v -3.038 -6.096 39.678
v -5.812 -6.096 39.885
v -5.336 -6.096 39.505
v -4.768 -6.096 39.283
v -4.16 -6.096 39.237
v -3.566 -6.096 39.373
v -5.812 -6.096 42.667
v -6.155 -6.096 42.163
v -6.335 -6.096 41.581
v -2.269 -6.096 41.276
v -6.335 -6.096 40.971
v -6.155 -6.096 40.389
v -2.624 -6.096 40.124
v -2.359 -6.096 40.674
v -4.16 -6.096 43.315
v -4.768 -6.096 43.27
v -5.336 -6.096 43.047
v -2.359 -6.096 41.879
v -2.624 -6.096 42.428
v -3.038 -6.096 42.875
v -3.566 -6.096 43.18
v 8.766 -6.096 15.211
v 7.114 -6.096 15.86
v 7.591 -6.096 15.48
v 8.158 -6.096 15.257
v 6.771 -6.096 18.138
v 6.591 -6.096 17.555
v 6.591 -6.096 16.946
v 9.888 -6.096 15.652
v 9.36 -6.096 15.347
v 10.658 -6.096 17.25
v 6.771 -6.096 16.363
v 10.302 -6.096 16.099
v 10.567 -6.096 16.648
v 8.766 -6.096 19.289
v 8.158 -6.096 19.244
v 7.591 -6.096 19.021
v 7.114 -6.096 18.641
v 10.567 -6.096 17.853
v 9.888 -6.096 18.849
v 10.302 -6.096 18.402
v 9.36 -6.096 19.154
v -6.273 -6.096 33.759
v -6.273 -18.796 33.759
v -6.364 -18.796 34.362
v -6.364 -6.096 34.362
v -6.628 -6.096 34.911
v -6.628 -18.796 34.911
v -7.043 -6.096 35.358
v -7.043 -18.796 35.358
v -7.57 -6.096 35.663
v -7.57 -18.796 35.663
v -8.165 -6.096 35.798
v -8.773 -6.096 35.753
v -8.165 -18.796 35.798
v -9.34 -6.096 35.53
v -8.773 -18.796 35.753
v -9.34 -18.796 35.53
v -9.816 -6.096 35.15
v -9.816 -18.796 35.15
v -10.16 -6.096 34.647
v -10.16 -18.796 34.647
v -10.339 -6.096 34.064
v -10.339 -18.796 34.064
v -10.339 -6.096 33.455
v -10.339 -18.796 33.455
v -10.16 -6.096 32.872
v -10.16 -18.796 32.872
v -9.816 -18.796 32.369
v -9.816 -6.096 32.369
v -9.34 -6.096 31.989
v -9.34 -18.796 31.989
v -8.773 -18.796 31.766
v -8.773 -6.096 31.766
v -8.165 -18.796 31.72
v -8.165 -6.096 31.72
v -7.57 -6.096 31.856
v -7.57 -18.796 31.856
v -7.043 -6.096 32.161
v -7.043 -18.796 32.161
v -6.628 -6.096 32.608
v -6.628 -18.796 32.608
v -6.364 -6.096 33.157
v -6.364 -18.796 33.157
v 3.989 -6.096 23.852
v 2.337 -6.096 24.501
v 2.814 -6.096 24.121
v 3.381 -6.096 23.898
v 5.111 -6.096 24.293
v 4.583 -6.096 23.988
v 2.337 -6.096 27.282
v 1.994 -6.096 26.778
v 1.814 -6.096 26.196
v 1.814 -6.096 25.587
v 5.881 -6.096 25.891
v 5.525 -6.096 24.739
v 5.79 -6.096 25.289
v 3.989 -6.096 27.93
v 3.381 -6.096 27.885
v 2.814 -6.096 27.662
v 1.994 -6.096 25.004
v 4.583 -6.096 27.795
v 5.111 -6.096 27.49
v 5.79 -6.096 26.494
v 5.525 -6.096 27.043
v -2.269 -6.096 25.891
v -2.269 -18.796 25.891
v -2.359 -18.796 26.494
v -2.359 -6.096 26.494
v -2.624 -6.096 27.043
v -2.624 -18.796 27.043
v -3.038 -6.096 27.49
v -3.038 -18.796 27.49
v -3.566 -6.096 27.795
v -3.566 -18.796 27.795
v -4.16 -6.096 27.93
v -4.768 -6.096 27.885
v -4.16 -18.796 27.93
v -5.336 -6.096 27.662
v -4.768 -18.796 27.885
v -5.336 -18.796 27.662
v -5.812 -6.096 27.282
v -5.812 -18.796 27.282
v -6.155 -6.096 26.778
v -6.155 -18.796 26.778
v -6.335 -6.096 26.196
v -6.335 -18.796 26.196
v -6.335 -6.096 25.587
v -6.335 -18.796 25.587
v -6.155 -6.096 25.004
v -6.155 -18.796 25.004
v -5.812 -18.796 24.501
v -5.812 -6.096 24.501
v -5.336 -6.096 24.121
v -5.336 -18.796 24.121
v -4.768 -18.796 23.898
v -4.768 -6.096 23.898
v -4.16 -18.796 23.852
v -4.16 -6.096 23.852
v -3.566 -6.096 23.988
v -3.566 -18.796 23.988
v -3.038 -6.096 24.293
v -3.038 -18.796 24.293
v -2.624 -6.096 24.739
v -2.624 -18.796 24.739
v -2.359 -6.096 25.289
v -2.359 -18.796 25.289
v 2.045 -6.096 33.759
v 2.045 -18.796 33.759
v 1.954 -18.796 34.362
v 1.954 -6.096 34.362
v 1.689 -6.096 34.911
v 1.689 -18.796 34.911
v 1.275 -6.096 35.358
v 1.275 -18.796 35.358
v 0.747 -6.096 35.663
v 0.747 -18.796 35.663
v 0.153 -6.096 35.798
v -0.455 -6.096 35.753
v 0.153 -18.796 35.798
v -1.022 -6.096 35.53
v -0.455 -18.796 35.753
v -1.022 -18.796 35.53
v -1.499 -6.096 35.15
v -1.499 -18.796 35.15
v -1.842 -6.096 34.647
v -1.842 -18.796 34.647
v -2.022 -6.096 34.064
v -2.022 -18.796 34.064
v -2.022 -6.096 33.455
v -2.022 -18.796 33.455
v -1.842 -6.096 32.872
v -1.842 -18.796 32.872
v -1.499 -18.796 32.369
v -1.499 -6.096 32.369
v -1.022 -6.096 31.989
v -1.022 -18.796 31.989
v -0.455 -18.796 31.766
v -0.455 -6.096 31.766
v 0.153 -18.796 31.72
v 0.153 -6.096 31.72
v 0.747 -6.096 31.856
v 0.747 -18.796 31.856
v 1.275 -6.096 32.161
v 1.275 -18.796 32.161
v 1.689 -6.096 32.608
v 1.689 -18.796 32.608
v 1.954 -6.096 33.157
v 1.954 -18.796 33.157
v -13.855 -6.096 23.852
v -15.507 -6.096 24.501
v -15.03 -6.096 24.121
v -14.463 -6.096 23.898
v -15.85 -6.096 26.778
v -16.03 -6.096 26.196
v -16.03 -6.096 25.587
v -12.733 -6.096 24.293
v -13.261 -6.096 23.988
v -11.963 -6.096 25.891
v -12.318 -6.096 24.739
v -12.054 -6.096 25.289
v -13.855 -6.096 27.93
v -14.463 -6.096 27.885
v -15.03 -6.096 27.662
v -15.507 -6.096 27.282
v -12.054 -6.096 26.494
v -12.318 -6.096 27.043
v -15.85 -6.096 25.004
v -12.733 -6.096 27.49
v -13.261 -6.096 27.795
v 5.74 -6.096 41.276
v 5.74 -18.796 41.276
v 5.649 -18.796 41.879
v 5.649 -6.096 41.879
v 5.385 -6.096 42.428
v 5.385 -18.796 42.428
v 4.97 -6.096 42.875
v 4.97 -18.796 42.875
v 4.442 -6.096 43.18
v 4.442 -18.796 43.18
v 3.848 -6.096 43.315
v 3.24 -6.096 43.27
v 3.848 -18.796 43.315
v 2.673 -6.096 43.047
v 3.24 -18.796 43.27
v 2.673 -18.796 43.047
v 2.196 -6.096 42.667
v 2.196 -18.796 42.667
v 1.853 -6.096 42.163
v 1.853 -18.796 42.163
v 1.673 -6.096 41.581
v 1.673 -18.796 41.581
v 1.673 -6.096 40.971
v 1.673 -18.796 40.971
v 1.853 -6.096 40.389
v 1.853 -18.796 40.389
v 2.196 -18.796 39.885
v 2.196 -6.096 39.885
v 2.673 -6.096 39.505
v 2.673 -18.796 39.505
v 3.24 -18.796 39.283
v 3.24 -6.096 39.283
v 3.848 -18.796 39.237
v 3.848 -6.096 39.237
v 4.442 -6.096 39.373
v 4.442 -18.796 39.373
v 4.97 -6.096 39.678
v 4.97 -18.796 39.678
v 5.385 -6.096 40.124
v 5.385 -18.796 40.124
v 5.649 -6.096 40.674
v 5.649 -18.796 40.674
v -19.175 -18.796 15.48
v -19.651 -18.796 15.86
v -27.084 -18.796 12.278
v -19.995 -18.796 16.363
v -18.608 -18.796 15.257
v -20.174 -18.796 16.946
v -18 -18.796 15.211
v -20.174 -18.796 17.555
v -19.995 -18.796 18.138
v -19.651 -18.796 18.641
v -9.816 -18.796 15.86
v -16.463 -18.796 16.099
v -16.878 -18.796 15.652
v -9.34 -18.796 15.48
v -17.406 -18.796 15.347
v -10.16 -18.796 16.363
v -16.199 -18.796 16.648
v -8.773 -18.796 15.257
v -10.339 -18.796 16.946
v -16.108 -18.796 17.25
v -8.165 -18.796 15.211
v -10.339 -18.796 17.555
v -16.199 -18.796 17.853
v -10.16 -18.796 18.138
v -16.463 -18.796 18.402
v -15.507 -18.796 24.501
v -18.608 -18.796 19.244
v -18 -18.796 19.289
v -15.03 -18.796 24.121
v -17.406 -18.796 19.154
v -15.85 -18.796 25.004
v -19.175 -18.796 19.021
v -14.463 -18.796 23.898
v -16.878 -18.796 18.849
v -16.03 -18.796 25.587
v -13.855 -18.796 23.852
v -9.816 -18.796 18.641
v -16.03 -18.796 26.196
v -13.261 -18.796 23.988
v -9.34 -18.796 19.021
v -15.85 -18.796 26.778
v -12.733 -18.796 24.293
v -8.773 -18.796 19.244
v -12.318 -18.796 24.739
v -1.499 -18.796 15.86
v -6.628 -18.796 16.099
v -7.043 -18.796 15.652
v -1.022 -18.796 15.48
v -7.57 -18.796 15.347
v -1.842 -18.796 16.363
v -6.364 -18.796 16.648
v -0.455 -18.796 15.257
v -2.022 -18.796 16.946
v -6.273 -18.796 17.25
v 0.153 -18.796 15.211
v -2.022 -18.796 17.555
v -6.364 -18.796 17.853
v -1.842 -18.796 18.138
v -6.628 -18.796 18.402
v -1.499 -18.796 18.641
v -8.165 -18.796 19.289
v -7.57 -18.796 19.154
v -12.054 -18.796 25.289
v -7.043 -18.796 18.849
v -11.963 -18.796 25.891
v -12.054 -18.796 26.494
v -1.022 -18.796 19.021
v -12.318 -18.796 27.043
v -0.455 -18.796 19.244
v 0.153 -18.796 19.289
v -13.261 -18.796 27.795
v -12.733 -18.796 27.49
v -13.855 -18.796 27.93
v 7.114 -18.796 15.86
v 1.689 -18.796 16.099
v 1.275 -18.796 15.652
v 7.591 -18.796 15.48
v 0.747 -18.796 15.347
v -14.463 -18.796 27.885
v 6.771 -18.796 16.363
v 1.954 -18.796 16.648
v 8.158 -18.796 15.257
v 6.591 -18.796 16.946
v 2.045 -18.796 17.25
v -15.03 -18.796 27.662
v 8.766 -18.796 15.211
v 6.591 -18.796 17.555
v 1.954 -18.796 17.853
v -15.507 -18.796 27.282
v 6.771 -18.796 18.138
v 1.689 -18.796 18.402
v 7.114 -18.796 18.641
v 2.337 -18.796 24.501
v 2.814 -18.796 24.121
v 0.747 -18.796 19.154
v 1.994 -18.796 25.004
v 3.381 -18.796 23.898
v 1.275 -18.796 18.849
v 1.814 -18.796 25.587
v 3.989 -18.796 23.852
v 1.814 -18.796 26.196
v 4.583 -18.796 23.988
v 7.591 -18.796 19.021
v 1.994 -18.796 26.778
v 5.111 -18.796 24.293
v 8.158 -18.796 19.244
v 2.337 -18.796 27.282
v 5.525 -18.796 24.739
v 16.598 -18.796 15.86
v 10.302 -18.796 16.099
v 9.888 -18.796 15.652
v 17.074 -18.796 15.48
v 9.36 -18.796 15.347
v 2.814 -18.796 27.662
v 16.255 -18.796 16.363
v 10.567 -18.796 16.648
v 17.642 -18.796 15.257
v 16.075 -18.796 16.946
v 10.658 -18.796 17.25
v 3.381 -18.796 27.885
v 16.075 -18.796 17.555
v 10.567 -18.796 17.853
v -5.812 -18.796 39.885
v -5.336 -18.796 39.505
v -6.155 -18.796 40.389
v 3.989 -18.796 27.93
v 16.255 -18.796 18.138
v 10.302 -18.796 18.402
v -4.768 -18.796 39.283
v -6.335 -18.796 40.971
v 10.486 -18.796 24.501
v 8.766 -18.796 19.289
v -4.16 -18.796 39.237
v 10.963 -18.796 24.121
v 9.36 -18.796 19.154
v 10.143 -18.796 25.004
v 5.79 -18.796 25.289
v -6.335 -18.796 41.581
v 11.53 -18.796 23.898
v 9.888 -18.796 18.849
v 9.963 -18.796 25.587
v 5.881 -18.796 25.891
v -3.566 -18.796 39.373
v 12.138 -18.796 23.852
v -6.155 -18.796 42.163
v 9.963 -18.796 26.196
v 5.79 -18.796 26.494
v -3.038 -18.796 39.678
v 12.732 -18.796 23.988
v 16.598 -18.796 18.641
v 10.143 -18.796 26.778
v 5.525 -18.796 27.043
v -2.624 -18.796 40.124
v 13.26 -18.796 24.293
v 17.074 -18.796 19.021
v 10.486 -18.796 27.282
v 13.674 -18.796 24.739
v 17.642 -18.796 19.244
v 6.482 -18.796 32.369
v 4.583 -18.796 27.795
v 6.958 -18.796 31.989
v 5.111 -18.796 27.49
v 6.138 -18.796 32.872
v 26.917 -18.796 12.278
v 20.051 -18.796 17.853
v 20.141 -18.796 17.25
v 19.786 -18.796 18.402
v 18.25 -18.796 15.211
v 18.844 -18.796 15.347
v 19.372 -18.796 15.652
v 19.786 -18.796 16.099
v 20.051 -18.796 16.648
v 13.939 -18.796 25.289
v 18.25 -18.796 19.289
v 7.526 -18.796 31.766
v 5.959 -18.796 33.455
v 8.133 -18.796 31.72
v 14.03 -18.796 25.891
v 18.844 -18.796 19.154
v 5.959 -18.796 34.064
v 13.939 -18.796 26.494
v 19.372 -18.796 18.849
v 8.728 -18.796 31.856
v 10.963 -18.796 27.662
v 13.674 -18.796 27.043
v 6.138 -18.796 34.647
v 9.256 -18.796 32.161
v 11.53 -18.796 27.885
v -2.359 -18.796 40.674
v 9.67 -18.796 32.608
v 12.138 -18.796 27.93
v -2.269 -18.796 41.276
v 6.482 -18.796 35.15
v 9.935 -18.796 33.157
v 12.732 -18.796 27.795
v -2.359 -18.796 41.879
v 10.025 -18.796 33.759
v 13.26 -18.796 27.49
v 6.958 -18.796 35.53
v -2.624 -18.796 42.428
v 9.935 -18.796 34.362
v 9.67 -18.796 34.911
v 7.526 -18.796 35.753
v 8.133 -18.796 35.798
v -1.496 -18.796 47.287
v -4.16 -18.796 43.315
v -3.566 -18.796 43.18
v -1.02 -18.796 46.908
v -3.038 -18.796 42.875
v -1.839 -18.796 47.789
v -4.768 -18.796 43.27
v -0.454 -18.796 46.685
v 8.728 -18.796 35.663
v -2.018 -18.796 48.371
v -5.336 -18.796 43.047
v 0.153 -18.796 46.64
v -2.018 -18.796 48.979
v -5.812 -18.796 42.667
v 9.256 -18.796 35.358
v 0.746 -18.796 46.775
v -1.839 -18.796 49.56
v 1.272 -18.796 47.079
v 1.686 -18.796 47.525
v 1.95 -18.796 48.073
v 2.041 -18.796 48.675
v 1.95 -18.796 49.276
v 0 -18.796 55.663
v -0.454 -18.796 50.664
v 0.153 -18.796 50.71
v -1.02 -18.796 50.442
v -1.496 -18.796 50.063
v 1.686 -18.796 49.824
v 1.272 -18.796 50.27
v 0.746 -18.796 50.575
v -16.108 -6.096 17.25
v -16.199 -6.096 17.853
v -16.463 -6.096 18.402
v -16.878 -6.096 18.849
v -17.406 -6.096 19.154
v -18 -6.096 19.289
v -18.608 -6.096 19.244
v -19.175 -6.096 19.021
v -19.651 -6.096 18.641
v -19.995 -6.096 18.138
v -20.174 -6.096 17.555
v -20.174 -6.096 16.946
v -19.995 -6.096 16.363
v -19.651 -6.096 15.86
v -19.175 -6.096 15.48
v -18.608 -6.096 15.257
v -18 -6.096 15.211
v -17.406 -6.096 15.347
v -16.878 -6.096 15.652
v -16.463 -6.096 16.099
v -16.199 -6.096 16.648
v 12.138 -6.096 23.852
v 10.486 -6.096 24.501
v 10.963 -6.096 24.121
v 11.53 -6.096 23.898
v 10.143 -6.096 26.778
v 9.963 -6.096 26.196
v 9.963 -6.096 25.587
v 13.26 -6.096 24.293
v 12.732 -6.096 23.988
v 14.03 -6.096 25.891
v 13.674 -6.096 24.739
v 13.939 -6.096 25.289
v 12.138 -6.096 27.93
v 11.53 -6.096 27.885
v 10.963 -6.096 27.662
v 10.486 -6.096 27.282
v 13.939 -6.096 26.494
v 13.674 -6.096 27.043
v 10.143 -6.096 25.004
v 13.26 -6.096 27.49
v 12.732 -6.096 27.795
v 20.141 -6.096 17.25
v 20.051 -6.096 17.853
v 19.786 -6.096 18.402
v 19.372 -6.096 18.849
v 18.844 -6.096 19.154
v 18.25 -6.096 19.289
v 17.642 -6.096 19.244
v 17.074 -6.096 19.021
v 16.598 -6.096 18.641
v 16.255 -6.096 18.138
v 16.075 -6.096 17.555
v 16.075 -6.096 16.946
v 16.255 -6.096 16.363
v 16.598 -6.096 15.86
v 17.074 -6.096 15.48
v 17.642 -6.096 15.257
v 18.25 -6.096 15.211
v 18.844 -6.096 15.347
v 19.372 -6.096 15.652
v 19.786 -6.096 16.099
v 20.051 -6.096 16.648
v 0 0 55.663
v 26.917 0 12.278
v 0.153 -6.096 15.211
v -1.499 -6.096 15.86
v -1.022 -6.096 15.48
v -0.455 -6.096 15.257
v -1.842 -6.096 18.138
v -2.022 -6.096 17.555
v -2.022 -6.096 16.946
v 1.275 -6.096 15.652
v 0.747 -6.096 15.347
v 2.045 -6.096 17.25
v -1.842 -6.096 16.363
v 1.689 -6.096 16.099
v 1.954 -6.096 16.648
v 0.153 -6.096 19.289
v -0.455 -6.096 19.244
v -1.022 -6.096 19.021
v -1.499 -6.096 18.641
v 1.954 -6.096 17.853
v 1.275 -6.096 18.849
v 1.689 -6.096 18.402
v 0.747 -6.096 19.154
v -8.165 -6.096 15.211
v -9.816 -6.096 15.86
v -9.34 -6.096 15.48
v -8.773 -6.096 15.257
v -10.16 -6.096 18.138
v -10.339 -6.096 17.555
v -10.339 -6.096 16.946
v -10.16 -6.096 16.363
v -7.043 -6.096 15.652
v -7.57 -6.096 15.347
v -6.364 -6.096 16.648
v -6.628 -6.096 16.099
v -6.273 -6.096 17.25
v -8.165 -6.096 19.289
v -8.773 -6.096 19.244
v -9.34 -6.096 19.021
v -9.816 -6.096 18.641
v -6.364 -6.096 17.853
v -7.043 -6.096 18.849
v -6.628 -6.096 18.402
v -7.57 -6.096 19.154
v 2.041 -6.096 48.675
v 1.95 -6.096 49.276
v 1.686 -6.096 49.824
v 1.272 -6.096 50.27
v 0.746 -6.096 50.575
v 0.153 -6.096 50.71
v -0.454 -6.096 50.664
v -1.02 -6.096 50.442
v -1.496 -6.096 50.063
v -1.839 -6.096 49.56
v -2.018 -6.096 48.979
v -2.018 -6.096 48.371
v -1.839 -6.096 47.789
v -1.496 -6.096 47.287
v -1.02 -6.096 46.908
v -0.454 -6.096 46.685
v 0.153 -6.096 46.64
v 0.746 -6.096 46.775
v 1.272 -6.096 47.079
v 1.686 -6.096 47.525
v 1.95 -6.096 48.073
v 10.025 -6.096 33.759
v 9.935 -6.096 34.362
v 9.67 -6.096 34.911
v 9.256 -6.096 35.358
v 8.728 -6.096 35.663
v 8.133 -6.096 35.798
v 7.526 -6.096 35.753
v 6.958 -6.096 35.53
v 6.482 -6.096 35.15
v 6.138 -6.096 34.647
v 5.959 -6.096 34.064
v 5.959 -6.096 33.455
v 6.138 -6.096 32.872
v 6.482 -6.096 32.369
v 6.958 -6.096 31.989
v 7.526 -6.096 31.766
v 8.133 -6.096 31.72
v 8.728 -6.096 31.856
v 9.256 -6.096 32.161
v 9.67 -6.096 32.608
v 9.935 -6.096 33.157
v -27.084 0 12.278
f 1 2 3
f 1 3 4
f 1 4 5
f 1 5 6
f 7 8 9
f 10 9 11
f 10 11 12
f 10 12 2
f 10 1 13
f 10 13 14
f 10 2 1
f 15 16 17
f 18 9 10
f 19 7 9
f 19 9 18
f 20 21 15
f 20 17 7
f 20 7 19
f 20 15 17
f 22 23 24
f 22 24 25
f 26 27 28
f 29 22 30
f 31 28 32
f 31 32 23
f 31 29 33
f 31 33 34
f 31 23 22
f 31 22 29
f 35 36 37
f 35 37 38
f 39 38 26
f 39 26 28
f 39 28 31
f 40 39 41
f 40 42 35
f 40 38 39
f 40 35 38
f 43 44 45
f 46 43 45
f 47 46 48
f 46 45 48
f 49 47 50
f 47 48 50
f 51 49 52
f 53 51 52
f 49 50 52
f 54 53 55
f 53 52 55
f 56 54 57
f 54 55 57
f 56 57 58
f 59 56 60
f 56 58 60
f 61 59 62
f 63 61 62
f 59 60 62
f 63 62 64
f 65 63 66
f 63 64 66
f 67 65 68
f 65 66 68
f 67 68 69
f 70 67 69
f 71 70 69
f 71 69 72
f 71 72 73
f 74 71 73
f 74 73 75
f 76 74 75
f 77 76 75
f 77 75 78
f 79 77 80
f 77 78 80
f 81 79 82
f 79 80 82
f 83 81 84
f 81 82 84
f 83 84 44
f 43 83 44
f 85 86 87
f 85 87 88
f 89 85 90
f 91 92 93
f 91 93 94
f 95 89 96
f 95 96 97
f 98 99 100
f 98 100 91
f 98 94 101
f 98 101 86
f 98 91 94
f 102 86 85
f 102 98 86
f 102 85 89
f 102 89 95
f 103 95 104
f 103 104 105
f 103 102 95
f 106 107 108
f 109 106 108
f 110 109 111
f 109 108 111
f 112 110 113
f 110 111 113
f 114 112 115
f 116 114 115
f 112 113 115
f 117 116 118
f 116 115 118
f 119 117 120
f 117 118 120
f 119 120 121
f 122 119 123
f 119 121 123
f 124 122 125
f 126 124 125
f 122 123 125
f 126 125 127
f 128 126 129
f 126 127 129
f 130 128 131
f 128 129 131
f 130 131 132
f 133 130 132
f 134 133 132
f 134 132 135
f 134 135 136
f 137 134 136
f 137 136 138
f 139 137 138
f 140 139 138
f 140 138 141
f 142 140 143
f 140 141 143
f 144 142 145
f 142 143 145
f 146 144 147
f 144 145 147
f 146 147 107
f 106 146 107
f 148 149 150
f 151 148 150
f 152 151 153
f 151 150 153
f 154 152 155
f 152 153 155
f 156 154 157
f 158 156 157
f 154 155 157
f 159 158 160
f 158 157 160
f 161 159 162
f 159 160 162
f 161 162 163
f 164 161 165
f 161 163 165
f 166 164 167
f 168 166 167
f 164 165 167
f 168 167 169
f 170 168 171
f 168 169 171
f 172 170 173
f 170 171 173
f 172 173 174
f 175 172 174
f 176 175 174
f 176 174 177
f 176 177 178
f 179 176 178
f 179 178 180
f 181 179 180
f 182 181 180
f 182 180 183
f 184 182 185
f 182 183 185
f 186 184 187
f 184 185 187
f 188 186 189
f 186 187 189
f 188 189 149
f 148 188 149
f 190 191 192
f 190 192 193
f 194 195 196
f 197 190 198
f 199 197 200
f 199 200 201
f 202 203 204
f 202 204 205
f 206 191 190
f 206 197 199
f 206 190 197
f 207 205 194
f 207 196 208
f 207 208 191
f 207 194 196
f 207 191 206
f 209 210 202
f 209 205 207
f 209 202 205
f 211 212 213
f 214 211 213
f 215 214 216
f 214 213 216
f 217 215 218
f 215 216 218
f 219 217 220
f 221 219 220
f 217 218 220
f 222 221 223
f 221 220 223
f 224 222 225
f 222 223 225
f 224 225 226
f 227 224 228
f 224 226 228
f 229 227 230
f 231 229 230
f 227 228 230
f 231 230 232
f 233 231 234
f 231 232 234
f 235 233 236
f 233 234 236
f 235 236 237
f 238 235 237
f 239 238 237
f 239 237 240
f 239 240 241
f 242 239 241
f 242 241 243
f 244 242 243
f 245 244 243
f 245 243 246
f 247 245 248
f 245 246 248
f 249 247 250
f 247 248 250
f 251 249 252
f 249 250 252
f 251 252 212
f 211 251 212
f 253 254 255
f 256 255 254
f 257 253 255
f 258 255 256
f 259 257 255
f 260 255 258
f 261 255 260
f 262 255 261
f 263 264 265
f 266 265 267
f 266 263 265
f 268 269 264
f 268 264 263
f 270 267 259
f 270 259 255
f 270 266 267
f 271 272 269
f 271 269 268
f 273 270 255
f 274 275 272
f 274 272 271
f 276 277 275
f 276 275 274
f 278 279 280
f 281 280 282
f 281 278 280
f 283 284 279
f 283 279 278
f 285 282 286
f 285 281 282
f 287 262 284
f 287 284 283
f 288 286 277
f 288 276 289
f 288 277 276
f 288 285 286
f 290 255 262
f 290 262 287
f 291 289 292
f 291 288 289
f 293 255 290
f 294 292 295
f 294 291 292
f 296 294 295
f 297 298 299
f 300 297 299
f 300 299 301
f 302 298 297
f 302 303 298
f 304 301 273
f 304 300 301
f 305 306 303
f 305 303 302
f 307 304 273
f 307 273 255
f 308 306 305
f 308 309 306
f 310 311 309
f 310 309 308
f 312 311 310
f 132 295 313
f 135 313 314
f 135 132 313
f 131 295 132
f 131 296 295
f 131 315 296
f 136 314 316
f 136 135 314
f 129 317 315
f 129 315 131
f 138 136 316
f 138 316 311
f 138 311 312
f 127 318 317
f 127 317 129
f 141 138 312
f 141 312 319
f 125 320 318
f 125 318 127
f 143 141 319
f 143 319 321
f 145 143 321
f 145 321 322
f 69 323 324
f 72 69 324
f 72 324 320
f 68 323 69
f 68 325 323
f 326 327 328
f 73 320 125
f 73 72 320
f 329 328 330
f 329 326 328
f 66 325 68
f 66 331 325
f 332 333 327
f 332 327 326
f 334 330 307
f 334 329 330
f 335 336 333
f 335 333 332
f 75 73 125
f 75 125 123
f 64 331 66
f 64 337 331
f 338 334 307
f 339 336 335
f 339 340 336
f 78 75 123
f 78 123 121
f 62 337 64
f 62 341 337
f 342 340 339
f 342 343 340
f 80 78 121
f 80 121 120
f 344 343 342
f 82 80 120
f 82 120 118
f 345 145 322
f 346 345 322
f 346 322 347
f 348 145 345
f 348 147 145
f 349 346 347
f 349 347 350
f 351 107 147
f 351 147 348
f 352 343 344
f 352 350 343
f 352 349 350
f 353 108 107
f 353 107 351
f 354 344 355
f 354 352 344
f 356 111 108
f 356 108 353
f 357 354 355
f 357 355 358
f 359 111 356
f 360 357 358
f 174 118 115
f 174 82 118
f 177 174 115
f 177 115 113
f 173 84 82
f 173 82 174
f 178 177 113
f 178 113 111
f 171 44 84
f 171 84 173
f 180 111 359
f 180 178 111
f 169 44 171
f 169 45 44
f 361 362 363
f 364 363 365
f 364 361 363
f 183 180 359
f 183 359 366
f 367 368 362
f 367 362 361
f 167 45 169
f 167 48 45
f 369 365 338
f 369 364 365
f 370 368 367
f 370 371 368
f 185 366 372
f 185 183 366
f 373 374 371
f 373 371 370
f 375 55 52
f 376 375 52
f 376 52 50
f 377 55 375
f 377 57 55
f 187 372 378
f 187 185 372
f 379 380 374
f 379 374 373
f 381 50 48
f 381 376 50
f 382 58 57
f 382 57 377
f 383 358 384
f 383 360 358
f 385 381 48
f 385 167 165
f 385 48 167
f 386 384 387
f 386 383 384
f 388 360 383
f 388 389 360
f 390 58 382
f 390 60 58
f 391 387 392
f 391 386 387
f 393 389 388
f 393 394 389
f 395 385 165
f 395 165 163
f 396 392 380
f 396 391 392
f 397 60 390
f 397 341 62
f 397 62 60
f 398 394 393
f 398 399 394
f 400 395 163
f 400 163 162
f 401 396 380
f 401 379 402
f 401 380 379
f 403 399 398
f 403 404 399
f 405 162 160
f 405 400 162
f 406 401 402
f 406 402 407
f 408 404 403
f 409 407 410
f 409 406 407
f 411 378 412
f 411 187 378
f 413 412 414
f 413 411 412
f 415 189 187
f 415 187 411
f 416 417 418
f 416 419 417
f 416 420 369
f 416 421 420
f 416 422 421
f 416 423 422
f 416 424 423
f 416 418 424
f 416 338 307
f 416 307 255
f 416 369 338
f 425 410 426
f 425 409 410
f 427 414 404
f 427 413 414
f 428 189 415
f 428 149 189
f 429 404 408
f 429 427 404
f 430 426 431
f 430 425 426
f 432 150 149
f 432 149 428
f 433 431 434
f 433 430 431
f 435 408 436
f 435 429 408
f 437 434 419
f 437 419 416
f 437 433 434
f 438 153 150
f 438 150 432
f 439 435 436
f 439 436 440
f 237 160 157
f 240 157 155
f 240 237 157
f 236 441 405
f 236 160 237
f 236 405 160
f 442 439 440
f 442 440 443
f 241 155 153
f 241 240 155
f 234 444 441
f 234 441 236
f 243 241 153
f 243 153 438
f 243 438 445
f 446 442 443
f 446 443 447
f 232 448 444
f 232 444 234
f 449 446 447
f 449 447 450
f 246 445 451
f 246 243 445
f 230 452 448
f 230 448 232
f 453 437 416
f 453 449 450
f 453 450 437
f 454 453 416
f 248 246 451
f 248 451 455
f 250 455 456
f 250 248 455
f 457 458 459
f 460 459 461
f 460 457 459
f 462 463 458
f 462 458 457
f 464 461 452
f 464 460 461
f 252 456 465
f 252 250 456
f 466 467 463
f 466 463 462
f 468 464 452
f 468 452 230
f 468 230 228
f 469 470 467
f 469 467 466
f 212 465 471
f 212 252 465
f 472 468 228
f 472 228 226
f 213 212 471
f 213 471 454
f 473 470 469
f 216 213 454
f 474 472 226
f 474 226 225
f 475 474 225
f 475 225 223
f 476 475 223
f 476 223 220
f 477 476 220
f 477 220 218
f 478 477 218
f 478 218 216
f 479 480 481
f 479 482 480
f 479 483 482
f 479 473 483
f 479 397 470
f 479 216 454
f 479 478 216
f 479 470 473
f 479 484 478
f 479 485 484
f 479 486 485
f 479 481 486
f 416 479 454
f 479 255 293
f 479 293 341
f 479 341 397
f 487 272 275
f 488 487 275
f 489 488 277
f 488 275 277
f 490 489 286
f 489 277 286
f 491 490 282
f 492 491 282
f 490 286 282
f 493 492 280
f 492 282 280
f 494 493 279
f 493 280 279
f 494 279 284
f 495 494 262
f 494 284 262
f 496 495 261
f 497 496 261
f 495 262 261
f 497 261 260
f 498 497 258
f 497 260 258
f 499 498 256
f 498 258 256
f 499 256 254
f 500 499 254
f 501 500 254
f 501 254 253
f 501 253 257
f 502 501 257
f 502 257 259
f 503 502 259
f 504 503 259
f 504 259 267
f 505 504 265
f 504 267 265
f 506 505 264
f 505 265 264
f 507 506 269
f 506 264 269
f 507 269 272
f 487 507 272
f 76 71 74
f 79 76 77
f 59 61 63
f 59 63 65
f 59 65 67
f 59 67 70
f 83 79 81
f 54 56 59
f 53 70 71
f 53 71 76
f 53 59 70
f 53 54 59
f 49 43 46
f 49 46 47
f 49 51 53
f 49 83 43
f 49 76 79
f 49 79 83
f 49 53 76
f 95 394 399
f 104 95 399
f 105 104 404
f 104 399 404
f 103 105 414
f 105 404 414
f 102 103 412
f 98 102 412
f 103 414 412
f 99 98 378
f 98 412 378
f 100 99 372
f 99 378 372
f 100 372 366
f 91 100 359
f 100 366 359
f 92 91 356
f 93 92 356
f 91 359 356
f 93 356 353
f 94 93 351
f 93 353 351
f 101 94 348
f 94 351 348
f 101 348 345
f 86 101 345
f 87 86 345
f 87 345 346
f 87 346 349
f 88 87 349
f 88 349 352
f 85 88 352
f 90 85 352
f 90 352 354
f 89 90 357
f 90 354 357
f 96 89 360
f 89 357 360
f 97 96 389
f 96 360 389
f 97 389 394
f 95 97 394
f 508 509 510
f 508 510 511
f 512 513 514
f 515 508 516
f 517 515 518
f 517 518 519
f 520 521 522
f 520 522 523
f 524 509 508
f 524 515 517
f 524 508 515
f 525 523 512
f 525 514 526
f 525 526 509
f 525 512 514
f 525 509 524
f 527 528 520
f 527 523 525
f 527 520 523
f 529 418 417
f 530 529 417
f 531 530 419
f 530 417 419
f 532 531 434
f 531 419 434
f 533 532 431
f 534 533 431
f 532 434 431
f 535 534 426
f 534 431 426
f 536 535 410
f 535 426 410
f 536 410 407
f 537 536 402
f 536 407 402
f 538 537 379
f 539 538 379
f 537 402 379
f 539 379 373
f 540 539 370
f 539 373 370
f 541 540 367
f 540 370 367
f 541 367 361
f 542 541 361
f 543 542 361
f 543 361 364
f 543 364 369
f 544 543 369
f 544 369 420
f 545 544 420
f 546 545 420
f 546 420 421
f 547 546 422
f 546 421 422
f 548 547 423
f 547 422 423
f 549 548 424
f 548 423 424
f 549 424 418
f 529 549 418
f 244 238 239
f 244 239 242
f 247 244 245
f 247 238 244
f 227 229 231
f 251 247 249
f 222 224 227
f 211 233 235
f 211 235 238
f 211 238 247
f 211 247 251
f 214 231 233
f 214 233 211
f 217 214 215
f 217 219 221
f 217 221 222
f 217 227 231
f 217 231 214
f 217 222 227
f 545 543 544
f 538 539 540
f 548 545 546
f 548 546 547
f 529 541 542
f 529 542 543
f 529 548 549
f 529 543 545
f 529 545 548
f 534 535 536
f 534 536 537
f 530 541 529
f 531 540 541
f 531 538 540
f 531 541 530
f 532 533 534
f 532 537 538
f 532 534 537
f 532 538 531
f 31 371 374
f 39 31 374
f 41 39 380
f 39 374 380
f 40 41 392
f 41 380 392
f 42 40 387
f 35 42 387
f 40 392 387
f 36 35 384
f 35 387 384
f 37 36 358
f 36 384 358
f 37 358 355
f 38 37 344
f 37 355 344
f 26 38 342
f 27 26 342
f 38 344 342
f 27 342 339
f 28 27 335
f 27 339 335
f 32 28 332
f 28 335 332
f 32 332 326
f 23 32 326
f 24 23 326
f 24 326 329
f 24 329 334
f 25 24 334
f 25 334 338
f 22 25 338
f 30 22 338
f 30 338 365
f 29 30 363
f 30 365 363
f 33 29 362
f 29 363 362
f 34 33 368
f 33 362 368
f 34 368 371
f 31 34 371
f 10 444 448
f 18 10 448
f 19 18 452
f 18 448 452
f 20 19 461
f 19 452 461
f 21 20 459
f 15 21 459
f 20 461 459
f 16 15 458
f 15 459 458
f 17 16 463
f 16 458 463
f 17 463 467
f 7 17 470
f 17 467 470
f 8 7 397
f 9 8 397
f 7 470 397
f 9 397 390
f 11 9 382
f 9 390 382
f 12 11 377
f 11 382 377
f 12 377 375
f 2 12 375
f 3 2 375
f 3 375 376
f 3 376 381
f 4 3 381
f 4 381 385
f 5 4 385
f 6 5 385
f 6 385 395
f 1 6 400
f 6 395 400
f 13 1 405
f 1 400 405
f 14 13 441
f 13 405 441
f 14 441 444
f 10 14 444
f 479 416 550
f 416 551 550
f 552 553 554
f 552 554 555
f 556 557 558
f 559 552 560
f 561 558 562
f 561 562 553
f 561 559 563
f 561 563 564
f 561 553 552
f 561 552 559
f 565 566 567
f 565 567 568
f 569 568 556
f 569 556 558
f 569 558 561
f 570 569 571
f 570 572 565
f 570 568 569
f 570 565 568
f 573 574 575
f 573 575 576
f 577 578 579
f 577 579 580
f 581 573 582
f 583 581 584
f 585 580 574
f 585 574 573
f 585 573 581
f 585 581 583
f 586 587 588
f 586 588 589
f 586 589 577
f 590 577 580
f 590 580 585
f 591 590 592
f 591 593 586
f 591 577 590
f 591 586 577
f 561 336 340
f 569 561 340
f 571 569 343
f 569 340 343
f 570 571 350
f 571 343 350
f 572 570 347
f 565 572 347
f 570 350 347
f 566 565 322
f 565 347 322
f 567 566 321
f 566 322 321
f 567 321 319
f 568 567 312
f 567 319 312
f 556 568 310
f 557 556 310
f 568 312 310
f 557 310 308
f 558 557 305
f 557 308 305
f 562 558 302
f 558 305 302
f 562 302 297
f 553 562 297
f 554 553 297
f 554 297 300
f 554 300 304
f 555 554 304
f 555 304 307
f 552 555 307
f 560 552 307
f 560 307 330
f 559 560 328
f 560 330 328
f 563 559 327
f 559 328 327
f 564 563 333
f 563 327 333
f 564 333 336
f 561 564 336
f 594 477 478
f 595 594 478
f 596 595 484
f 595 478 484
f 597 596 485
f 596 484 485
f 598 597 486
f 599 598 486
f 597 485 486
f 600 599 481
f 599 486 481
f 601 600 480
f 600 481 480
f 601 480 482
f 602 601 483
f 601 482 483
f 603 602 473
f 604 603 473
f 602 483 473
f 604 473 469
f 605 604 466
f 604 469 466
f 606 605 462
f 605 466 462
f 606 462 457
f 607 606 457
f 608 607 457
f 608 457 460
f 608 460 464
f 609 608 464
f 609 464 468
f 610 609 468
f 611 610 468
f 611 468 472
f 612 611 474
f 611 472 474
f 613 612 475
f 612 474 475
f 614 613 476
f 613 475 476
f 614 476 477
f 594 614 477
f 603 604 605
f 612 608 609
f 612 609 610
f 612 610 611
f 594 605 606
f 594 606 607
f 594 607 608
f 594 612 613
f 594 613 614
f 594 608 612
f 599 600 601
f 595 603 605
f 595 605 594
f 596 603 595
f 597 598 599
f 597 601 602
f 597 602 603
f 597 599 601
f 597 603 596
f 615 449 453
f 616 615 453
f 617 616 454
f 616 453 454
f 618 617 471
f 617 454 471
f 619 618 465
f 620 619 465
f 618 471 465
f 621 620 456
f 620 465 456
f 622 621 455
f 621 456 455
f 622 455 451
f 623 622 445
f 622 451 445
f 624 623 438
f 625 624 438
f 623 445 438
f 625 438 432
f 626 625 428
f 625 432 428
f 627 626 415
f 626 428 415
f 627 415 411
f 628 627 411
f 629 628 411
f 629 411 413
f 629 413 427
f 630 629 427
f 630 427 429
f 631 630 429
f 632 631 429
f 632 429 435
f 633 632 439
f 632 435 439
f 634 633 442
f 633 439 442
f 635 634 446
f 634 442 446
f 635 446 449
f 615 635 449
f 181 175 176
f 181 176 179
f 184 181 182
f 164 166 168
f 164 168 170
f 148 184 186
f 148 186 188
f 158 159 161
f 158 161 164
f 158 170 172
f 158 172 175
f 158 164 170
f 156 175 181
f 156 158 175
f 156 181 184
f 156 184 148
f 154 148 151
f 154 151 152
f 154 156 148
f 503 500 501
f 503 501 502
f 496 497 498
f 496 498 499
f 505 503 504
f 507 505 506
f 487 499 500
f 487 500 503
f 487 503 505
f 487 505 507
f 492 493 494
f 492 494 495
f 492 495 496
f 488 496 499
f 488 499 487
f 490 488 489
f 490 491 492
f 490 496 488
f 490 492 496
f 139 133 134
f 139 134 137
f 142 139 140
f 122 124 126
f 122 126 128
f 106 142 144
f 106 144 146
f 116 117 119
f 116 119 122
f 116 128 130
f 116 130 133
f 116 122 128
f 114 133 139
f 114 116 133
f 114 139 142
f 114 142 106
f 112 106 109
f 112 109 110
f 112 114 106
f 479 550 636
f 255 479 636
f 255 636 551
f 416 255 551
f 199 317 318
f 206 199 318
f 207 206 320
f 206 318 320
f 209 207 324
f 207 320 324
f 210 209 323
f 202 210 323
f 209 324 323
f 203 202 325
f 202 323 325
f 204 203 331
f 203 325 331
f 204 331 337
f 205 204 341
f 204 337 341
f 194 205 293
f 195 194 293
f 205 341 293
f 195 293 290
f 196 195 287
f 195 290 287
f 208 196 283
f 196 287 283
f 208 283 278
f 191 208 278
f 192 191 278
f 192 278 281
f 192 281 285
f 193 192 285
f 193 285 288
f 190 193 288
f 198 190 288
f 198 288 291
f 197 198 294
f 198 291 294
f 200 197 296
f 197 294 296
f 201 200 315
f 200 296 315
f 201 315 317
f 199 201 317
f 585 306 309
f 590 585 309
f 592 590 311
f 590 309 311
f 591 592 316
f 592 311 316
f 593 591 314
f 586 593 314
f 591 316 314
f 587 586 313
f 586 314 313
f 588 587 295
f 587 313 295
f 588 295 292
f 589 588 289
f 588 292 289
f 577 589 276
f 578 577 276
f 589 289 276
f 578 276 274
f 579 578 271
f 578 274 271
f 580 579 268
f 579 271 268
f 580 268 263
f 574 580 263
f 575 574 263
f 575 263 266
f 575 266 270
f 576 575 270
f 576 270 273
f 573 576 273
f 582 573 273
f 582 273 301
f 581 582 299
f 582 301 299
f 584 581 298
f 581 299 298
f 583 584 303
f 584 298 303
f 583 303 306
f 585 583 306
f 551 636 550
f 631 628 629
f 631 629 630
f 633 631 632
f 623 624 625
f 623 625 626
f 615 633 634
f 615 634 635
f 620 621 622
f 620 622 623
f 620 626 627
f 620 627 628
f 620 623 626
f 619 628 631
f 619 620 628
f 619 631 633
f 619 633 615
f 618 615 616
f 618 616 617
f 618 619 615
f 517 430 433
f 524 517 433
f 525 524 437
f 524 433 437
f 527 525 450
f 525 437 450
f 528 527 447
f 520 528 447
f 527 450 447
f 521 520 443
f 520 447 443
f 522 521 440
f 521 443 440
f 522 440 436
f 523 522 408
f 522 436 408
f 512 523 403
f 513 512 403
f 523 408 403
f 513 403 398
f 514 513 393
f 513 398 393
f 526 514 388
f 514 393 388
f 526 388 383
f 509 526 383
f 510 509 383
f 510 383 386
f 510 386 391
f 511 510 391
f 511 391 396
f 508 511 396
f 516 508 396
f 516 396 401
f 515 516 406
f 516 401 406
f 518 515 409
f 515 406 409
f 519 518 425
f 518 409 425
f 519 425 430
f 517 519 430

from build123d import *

# Parameters (mm, degrees)
F1_DEPTH = 1.016
F2_DEPTH = 17.78
F3_R     = 2.0447
F3_R_2   = 2.0406784107
F4_DEPTH = 12.7


# Not quite as in the source:
# - a feature names something its author has since deleted; it is built from what else it names


with BuildPart() as f1:
    # F0 (on Front) → F1 (new body)
    with BuildSketch(Plane.XZ):
        Polygon((-27.083877352, 12.2783370181), (26.9169844677, 12.2783370181), (0, 55.663280189), align=None)
    extrude(amount=F1_DEPTH)

    # F2 (add): a face of the model
    f2_faces = [f1.faces().sort_by_distance(p)[0] for p in [
        (-0.0556309614, -1.016, 26.7399847417),
    ]]
    extrude(f2_faces, amount=F2_DEPTH)

    # F3 (on face) → F4 (cut)
    with BuildSketch(Plane.XZ.offset(18.796)):
        with Locations((3.6953620147, 41.2761941552)):
            Circle(F3_R)
        with Locations((0, 48.6748889089)):
            Circle(F3_R_2)
        with Locations((-4.3132207356, 41.2761941552)):
            Circle(F3_R)
        with Locations((0, 33.7593667209)):
            Circle(F3_R)
        with Locations((7.9806558788, 33.7593667209)):
            Circle(F3_R)
        with Locations((-8.3175115287, 33.7593667209)):
            Circle(F3_R)
        with Locations((-4.3132207356, 25.8912853897)):
            Circle(F3_R)
        with Locations((-14.0078207478, 25.8912853897)):
            Circle(F3_R)
        with Locations((3.8358634338, 25.8912853897)):
            Circle(F3_R)
        with Locations((11.9849471375, 25.8912853897)):
            Circle(F3_R)
        with Locations((18.096761778, 17.2504447401)):
            Circle(F3_R)
        with Locations((8.6129121482, 17.2504447401)):
            Circle(F3_R)
        with Locations((0, 17.2504447401)):
            Circle(F3_R)
        with Locations((-8.3175115287, 17.2504447401)):
            Circle(F3_R)
        with Locations((-18.1526131928, 17.2504447401)):
            Circle(F3_R)
    extrude(amount=-F4_DEPTH, mode=Mode.SUBTRACT)


solid = f1.part
